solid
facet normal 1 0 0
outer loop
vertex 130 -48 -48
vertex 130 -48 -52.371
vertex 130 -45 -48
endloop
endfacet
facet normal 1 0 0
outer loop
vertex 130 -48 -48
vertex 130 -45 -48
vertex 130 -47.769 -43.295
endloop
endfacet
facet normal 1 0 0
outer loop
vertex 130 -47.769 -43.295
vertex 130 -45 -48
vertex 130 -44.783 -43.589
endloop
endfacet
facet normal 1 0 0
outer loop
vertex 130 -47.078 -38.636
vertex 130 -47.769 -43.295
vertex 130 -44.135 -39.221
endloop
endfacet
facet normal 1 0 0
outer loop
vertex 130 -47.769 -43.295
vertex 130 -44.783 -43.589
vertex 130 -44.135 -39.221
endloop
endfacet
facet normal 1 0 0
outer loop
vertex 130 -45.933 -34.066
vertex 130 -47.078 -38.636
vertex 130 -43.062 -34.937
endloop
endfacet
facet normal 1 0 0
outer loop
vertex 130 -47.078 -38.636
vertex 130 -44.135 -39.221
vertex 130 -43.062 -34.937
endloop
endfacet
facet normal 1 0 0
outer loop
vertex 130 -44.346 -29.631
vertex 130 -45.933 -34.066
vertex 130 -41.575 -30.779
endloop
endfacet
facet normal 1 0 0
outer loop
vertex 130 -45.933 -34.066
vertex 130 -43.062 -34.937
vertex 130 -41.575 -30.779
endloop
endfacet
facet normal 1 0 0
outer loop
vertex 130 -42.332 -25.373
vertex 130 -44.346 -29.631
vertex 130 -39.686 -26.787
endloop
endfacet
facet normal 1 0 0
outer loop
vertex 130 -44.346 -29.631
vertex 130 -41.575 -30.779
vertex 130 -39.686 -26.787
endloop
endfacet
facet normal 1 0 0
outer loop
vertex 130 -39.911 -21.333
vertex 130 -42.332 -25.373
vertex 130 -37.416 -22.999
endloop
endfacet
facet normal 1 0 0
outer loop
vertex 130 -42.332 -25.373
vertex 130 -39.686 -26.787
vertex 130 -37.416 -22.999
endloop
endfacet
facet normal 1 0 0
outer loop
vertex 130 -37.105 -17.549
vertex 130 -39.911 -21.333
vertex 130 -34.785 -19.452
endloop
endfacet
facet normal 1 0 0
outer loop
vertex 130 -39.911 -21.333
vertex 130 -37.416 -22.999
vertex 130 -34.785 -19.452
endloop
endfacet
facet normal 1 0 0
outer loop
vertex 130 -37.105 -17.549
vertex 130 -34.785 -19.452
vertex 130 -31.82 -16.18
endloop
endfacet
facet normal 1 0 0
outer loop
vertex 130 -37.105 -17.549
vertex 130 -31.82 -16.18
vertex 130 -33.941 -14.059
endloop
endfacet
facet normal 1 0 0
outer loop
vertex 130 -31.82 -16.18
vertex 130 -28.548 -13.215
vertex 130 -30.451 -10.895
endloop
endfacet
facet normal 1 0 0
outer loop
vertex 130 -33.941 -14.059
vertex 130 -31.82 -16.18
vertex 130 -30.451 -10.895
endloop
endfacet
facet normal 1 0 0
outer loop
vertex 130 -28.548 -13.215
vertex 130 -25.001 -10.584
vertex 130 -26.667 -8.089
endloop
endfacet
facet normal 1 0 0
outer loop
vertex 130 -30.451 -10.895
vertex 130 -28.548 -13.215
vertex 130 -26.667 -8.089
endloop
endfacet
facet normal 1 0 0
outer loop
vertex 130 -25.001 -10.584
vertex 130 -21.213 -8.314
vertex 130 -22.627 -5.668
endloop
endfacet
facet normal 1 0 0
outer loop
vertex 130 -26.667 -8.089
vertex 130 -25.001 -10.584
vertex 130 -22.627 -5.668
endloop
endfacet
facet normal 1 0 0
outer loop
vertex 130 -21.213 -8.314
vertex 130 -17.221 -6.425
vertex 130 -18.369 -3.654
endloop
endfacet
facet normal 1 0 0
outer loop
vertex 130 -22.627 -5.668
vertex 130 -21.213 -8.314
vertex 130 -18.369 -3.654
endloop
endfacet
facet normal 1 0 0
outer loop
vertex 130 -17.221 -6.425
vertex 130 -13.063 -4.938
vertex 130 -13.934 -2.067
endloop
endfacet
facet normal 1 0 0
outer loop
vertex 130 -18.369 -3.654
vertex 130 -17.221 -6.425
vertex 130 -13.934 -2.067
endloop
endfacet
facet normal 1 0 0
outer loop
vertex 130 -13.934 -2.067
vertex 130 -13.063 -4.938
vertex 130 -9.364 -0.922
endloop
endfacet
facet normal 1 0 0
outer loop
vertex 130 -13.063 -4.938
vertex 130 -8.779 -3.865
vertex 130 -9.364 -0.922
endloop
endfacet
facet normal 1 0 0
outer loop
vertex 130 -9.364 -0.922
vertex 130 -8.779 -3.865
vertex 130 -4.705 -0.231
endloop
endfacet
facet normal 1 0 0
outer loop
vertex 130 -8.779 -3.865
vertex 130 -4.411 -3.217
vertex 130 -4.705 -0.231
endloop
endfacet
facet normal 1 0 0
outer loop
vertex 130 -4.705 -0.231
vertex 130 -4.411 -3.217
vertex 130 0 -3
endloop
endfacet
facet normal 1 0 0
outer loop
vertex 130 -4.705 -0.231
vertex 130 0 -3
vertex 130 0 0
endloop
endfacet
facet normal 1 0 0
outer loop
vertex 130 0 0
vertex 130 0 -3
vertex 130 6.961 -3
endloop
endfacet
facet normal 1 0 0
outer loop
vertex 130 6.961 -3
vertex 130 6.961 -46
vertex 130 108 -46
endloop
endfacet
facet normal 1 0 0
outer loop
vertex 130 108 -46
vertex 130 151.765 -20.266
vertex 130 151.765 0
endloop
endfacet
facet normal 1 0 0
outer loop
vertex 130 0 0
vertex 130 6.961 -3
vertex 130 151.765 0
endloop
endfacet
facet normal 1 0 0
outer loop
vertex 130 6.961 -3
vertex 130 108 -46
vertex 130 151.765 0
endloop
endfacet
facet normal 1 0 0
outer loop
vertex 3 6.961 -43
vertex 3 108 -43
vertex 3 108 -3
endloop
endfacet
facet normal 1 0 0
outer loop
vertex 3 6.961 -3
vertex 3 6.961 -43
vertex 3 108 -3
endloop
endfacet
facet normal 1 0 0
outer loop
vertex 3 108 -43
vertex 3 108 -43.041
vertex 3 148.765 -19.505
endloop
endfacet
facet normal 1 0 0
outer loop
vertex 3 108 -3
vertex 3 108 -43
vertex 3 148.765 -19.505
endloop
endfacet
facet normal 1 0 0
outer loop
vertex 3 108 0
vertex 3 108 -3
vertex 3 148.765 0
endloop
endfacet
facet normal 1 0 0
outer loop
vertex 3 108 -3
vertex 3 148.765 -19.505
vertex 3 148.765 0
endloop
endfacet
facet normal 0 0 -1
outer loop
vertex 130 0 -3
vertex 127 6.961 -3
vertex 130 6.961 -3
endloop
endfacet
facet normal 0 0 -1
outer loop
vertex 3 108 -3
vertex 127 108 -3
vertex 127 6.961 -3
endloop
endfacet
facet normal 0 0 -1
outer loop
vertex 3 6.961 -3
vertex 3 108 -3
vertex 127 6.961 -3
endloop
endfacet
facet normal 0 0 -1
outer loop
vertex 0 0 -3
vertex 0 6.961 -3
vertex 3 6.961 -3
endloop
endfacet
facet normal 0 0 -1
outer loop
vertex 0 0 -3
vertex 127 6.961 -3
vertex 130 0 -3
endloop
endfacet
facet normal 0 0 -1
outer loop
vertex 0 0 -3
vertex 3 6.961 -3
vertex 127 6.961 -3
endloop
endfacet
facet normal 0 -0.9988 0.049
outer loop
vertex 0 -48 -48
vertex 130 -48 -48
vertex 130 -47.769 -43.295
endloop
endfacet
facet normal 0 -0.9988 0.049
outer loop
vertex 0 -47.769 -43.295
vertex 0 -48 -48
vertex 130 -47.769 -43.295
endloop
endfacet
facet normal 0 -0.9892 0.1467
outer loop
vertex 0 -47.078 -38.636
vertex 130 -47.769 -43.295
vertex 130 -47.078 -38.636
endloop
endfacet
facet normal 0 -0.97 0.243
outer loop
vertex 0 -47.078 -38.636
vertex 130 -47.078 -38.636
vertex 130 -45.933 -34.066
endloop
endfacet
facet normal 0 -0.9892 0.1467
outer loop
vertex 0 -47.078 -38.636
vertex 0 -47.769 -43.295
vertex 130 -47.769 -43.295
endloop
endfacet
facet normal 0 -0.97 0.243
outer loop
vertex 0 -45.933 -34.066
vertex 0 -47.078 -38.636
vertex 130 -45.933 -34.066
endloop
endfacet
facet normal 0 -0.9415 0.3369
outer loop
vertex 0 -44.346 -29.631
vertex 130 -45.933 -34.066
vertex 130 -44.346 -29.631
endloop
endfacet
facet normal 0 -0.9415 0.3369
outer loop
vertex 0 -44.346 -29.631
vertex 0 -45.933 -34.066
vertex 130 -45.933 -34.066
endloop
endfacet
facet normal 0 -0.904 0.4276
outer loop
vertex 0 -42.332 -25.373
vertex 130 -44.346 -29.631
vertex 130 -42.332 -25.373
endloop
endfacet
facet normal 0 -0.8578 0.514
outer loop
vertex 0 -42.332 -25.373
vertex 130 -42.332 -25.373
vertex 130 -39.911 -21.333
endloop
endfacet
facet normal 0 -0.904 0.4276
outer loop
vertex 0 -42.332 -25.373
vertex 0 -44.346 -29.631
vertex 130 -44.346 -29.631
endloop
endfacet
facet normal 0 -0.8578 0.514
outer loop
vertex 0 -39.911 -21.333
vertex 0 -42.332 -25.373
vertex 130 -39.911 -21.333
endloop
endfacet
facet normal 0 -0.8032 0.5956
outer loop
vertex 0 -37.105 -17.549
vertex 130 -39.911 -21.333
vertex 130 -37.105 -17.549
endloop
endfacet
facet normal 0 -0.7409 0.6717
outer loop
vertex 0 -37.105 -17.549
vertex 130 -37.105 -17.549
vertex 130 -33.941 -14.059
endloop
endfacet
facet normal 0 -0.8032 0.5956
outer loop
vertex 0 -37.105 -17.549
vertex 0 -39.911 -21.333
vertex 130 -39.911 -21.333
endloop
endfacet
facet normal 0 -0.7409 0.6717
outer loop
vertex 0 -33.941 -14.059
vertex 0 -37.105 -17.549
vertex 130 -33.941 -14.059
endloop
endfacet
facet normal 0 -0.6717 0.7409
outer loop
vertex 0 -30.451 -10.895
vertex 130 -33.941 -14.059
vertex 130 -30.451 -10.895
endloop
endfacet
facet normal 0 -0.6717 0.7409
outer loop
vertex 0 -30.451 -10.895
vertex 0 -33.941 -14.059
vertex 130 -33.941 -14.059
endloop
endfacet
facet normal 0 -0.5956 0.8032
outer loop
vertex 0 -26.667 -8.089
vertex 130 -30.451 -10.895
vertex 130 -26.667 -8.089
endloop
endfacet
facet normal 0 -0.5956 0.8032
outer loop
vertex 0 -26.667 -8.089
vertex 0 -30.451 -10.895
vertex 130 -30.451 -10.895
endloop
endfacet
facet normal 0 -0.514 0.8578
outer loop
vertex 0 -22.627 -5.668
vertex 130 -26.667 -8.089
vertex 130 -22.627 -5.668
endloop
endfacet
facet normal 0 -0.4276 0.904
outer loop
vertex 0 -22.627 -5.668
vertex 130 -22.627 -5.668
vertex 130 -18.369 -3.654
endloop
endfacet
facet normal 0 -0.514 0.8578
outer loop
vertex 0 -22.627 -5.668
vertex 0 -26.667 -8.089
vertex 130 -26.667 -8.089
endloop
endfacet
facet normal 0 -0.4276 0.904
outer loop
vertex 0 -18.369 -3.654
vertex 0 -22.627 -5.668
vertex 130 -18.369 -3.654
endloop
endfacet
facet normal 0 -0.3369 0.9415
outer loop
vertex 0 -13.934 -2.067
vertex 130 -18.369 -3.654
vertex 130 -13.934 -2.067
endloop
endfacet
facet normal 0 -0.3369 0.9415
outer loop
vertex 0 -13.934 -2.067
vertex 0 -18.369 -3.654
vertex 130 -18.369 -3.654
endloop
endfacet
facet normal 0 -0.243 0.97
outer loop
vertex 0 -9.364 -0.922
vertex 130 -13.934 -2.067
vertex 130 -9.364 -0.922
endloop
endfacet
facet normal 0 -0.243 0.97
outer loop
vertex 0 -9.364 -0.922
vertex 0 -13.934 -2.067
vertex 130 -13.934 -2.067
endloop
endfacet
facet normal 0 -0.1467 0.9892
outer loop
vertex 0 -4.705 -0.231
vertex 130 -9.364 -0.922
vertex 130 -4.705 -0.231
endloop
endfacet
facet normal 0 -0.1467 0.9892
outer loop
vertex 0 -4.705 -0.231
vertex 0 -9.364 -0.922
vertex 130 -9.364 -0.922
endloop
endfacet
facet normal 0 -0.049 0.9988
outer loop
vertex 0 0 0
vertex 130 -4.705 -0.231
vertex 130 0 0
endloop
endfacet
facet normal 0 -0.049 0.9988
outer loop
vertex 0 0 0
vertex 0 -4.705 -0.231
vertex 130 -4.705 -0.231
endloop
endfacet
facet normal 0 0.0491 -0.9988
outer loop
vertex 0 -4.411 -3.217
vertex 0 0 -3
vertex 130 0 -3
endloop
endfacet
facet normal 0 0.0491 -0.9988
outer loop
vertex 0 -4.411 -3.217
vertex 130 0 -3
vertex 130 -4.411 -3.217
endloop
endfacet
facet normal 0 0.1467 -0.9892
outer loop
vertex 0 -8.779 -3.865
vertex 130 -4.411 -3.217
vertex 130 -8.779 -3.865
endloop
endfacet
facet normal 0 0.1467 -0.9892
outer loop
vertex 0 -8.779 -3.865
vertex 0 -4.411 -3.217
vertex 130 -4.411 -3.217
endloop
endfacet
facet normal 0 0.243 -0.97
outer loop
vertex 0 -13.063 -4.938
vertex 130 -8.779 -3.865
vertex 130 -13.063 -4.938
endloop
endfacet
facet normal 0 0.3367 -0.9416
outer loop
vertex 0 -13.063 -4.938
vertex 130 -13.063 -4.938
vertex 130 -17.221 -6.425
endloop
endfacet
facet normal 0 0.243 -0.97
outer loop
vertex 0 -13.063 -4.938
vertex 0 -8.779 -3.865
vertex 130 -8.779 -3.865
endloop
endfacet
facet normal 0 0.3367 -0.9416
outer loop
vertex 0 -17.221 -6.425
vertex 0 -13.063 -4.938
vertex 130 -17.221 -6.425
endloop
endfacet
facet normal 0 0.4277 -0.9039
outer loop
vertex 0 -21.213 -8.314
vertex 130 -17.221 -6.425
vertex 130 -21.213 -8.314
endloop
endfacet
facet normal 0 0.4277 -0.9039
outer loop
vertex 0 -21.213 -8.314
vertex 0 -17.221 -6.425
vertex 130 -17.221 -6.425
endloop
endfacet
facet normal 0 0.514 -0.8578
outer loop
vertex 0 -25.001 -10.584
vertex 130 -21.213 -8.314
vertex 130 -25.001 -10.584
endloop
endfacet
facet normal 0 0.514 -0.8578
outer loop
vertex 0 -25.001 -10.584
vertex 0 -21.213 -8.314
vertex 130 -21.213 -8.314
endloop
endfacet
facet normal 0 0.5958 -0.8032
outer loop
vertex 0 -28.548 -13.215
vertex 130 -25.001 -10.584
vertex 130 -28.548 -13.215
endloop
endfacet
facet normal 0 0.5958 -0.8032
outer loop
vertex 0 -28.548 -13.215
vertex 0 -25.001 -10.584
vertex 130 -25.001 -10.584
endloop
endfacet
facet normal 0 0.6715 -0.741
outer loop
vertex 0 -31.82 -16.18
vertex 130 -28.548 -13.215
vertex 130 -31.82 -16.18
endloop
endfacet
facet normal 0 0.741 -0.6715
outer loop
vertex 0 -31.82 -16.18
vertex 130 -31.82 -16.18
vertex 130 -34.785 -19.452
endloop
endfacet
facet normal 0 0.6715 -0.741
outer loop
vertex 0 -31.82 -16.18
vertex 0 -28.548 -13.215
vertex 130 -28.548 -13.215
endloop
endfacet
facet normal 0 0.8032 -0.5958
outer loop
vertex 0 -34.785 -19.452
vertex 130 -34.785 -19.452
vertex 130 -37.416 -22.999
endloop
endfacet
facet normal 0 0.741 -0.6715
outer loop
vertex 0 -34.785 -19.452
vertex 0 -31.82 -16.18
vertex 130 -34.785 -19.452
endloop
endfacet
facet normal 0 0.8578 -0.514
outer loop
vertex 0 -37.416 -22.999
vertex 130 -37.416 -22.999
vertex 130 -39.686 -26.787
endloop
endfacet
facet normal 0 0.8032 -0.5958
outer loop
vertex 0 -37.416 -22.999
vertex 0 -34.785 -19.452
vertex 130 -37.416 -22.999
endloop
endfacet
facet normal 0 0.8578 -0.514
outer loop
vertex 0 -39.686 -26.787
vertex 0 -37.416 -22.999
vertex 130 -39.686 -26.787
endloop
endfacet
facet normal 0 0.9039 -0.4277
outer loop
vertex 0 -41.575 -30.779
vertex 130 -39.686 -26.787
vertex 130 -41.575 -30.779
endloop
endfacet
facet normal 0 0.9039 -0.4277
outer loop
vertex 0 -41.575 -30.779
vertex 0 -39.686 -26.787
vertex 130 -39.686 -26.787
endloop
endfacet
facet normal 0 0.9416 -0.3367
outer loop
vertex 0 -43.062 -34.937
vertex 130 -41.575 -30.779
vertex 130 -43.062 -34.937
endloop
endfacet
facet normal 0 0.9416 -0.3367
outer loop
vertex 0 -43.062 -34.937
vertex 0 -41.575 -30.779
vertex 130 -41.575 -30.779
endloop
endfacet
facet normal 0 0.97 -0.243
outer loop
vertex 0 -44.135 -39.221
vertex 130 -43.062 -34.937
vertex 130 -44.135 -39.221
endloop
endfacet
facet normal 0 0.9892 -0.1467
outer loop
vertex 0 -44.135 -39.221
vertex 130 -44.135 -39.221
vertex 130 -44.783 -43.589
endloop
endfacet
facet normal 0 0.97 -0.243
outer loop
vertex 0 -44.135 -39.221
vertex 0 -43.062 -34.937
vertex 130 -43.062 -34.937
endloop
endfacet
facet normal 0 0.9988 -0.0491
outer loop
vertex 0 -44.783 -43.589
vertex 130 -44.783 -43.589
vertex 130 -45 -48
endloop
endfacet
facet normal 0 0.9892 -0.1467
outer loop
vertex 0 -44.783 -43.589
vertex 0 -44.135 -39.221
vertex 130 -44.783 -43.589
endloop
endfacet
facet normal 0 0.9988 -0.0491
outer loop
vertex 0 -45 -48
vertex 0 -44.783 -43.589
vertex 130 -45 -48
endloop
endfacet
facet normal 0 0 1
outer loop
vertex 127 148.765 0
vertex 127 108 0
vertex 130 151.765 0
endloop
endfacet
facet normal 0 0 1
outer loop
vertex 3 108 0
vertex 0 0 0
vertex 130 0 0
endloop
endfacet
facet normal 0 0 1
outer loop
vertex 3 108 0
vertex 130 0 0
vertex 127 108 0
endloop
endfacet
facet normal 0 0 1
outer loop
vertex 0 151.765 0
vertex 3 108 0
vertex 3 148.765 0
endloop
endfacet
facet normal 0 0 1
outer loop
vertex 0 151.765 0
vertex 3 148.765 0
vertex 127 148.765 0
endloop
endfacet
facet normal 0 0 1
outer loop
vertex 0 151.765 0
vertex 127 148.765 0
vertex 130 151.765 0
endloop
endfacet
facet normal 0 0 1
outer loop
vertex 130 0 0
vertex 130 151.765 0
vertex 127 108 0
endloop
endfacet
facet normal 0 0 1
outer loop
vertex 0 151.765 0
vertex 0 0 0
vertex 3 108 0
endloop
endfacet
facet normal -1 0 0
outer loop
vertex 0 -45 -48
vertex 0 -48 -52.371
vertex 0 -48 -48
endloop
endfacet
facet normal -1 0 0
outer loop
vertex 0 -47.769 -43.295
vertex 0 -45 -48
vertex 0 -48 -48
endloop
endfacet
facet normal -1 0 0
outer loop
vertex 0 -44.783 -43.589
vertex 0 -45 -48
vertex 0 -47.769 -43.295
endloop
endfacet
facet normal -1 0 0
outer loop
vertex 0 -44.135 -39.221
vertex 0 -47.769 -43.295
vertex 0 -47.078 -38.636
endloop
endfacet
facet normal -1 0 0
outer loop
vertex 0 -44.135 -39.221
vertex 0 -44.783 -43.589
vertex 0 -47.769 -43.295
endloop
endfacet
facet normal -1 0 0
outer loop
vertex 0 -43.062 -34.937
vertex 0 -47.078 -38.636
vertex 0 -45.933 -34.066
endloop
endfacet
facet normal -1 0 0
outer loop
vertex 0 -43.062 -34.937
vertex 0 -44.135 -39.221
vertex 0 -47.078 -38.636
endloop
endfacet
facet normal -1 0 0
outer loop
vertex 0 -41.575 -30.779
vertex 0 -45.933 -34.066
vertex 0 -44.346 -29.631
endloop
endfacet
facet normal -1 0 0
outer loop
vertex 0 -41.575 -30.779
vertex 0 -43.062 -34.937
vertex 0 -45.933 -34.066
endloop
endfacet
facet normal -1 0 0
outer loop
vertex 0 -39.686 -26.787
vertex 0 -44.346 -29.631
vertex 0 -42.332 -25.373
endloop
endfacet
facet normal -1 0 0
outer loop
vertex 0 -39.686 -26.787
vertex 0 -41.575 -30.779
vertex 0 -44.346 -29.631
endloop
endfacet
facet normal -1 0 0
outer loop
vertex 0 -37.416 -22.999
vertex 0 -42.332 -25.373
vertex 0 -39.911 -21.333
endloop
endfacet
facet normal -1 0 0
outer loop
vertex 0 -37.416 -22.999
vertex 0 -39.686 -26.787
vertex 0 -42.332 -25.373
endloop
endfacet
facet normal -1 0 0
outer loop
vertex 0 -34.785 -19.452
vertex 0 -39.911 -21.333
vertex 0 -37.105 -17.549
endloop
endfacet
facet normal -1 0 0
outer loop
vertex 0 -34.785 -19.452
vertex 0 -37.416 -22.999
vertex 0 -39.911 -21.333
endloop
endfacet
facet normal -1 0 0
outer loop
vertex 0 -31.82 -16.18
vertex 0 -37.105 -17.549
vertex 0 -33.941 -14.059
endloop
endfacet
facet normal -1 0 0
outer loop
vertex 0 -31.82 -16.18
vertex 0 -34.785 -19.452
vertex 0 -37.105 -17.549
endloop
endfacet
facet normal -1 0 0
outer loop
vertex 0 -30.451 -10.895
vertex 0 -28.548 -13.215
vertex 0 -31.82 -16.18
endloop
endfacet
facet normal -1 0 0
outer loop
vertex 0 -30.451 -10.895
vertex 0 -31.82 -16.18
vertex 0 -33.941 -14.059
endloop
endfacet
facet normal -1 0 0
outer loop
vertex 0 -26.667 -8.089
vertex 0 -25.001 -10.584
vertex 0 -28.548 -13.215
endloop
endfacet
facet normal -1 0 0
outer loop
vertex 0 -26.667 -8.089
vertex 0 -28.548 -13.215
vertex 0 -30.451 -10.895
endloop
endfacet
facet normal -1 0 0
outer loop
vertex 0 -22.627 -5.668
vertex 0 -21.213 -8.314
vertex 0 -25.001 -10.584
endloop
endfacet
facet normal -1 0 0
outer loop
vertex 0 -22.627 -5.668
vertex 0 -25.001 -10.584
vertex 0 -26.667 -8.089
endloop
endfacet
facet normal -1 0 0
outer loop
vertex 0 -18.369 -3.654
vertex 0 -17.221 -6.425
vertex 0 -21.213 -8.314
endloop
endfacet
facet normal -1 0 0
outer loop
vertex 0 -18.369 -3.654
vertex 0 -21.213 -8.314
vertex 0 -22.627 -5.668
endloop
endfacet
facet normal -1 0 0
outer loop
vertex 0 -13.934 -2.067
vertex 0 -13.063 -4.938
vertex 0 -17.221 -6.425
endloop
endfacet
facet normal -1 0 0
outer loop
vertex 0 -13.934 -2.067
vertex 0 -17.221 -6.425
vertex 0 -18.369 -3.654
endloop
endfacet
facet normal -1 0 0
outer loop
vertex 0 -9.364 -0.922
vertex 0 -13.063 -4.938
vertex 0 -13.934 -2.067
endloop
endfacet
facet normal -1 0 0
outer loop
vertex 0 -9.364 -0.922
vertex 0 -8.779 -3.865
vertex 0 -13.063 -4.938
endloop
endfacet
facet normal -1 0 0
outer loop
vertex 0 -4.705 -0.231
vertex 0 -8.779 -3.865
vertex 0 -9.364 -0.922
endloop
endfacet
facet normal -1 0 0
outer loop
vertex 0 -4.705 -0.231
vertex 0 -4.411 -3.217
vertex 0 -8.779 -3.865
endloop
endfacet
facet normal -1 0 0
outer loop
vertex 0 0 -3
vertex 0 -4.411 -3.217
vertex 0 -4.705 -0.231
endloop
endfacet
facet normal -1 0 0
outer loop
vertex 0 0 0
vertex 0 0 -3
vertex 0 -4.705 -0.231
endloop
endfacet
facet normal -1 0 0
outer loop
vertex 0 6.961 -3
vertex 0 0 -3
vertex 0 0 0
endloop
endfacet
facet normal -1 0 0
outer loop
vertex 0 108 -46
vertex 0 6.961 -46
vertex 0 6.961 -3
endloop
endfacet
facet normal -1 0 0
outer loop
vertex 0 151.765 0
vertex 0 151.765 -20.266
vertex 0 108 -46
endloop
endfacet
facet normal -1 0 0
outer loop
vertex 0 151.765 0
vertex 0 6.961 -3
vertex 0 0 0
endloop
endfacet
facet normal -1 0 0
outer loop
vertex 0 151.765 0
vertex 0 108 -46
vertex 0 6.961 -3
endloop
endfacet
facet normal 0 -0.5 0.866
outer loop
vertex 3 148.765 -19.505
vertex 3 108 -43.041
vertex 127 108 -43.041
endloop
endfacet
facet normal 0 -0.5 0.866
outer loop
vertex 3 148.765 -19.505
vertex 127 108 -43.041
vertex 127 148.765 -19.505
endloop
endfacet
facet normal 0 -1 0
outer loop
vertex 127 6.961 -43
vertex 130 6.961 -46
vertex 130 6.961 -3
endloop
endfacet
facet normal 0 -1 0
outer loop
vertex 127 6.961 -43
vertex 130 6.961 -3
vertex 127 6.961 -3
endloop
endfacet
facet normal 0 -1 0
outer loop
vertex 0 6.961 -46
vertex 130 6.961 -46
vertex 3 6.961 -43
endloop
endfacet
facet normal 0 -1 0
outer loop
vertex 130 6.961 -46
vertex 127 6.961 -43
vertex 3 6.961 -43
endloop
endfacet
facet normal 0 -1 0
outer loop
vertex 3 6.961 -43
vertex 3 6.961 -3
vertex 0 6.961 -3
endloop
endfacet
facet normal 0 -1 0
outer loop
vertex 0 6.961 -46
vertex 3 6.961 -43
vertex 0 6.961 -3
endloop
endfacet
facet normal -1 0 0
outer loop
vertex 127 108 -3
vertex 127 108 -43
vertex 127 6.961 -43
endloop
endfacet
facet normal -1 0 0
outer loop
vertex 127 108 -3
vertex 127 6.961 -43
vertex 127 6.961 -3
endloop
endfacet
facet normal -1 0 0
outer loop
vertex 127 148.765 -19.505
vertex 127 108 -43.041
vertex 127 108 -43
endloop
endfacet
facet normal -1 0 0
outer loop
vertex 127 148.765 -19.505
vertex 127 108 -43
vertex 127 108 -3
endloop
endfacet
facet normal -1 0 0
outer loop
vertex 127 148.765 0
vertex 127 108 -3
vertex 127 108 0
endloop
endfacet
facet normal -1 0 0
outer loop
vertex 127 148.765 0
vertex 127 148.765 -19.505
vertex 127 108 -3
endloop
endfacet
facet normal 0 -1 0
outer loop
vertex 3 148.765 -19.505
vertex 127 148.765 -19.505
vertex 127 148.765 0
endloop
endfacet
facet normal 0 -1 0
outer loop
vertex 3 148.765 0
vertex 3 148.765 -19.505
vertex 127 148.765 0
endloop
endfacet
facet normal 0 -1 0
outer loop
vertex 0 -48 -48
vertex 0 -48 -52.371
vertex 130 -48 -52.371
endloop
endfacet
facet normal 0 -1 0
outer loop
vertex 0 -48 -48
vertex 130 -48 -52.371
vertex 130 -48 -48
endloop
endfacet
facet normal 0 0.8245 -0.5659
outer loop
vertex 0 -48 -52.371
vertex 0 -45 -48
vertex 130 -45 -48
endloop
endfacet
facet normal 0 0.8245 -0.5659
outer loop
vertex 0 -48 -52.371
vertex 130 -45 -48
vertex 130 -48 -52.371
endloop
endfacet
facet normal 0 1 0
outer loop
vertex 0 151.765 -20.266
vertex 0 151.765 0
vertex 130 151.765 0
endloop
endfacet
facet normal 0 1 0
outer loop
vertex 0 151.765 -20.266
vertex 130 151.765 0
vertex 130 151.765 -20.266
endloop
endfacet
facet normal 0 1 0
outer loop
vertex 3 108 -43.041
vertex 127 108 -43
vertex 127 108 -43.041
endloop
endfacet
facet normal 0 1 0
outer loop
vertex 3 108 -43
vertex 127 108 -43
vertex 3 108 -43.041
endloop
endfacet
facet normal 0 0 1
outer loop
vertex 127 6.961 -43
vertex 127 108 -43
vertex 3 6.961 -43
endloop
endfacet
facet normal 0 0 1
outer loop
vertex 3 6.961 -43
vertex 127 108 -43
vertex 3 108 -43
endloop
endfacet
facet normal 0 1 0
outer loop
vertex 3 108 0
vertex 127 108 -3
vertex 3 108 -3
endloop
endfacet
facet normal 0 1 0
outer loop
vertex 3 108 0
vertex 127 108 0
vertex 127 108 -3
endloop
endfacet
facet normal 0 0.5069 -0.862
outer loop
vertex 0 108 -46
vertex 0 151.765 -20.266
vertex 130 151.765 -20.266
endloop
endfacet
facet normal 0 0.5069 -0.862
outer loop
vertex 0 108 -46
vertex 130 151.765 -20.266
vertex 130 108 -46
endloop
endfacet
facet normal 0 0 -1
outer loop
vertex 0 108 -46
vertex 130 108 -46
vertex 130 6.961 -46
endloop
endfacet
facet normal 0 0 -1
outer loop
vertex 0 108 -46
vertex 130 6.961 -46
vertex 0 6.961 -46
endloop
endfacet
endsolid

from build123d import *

# Parameters (mm, degrees)
BOSS_EXTRUDE1_DEPTH = 130
SKETCH2_W           = 3
SKETCH2_H           = 101.039132923
BOSS_EXTRUDE2_DEPTH = 40
SKETCH3_W           = 130
SKETCH3_H           = 101.039132923
BOSS_EXTRUDE3_DEPTH = 3
BOSS_EXTRUDE4_DEPTH = 130
BOSS_EXTRUDE5_DEPTH = 3
BOSS_EXTRUDE6_DEPTH = 3


with BuildPart() as part:
    # Sketch1 → Boss-Extrude1 (new body)
    with BuildSketch(Plane(origin=(0, 0, 0), x_dir=(0, 0, -1), z_dir=(1, 0, 0))):
        with BuildLine():
            Line((0, 0), (0, 108))
            Line((0, 108), (3, 108))
            Line((3, 108), (3, 0))
            ThreePointArc((3, 0), (16.180194847, -31.819805153), (48, -45))
            Line((48, -45), (52.371478475, -48))
            Line((52.371478475, -48), (48, -48))
            ThreePointArc((48, -48), (14.058874503, -33.941125497), (0, 0))
        make_face()
    extrude(amount=BOSS_EXTRUDE1_DEPTH)

    # Sketch2 → Boss-Extrude2 (add)
    with BuildSketch(Plane(origin=(0, 0, -3), x_dir=(-1, 0, 0), z_dir=(0, 0, -1))):
        with Locations((-128.5, 57.480433539)):
            Rectangle(SKETCH2_W, SKETCH2_H)
        with Locations((-1.5, 57.480433539)):
            Rectangle(SKETCH2_W, SKETCH2_H)
    extrude(amount=BOSS_EXTRUDE2_DEPTH)

    # Sketch3 → Boss-Extrude3 (add)
    with BuildSketch(Plane(origin=(0, 0, -43), x_dir=(-1, 0, 0), z_dir=(0, 0, -1))):
        with Locations((-65, 57.480433539)):
            Rectangle(SKETCH3_W, SKETCH3_H)
    extrude(amount=BOSS_EXTRUDE3_DEPTH)

    # Sketch5 → Boss-Extrude4 (add)
    with BuildSketch(Plane(origin=(130, 0, 0), x_dir=(0, 0, -1), z_dir=(1, 0, 0))):
        Polygon((43.040658043, 108), (19.504714564, 148.765449909), (0, 148.765449909), (0, 151.765449909), (20.265766112, 151.765449909), (46, 108), align=None)
    extrude(amount=-BOSS_EXTRUDE4_DEPTH)

    # Sketch6 → Boss-Extrude5 (add)
    with BuildSketch(Plane(origin=(130, 0, 0), x_dir=(0, 0, -1), z_dir=(1, 0, 0))):
        Polygon((43.040658043, 108), (0, 108), (0, 148.765449909), (19.504714564, 148.765449909), align=None)
    extrude(amount=-BOSS_EXTRUDE5_DEPTH)

    # Sketch7 → Boss-Extrude6 (add)
    with BuildSketch(Plane.ZY):
        Polygon((-43.040658043, 108), (0, 108), (0, 148.765449909), (-19.504714564, 148.765449909), align=None)
    extrude(amount=-BOSS_EXTRUDE6_DEPTH)


solid = part.part
